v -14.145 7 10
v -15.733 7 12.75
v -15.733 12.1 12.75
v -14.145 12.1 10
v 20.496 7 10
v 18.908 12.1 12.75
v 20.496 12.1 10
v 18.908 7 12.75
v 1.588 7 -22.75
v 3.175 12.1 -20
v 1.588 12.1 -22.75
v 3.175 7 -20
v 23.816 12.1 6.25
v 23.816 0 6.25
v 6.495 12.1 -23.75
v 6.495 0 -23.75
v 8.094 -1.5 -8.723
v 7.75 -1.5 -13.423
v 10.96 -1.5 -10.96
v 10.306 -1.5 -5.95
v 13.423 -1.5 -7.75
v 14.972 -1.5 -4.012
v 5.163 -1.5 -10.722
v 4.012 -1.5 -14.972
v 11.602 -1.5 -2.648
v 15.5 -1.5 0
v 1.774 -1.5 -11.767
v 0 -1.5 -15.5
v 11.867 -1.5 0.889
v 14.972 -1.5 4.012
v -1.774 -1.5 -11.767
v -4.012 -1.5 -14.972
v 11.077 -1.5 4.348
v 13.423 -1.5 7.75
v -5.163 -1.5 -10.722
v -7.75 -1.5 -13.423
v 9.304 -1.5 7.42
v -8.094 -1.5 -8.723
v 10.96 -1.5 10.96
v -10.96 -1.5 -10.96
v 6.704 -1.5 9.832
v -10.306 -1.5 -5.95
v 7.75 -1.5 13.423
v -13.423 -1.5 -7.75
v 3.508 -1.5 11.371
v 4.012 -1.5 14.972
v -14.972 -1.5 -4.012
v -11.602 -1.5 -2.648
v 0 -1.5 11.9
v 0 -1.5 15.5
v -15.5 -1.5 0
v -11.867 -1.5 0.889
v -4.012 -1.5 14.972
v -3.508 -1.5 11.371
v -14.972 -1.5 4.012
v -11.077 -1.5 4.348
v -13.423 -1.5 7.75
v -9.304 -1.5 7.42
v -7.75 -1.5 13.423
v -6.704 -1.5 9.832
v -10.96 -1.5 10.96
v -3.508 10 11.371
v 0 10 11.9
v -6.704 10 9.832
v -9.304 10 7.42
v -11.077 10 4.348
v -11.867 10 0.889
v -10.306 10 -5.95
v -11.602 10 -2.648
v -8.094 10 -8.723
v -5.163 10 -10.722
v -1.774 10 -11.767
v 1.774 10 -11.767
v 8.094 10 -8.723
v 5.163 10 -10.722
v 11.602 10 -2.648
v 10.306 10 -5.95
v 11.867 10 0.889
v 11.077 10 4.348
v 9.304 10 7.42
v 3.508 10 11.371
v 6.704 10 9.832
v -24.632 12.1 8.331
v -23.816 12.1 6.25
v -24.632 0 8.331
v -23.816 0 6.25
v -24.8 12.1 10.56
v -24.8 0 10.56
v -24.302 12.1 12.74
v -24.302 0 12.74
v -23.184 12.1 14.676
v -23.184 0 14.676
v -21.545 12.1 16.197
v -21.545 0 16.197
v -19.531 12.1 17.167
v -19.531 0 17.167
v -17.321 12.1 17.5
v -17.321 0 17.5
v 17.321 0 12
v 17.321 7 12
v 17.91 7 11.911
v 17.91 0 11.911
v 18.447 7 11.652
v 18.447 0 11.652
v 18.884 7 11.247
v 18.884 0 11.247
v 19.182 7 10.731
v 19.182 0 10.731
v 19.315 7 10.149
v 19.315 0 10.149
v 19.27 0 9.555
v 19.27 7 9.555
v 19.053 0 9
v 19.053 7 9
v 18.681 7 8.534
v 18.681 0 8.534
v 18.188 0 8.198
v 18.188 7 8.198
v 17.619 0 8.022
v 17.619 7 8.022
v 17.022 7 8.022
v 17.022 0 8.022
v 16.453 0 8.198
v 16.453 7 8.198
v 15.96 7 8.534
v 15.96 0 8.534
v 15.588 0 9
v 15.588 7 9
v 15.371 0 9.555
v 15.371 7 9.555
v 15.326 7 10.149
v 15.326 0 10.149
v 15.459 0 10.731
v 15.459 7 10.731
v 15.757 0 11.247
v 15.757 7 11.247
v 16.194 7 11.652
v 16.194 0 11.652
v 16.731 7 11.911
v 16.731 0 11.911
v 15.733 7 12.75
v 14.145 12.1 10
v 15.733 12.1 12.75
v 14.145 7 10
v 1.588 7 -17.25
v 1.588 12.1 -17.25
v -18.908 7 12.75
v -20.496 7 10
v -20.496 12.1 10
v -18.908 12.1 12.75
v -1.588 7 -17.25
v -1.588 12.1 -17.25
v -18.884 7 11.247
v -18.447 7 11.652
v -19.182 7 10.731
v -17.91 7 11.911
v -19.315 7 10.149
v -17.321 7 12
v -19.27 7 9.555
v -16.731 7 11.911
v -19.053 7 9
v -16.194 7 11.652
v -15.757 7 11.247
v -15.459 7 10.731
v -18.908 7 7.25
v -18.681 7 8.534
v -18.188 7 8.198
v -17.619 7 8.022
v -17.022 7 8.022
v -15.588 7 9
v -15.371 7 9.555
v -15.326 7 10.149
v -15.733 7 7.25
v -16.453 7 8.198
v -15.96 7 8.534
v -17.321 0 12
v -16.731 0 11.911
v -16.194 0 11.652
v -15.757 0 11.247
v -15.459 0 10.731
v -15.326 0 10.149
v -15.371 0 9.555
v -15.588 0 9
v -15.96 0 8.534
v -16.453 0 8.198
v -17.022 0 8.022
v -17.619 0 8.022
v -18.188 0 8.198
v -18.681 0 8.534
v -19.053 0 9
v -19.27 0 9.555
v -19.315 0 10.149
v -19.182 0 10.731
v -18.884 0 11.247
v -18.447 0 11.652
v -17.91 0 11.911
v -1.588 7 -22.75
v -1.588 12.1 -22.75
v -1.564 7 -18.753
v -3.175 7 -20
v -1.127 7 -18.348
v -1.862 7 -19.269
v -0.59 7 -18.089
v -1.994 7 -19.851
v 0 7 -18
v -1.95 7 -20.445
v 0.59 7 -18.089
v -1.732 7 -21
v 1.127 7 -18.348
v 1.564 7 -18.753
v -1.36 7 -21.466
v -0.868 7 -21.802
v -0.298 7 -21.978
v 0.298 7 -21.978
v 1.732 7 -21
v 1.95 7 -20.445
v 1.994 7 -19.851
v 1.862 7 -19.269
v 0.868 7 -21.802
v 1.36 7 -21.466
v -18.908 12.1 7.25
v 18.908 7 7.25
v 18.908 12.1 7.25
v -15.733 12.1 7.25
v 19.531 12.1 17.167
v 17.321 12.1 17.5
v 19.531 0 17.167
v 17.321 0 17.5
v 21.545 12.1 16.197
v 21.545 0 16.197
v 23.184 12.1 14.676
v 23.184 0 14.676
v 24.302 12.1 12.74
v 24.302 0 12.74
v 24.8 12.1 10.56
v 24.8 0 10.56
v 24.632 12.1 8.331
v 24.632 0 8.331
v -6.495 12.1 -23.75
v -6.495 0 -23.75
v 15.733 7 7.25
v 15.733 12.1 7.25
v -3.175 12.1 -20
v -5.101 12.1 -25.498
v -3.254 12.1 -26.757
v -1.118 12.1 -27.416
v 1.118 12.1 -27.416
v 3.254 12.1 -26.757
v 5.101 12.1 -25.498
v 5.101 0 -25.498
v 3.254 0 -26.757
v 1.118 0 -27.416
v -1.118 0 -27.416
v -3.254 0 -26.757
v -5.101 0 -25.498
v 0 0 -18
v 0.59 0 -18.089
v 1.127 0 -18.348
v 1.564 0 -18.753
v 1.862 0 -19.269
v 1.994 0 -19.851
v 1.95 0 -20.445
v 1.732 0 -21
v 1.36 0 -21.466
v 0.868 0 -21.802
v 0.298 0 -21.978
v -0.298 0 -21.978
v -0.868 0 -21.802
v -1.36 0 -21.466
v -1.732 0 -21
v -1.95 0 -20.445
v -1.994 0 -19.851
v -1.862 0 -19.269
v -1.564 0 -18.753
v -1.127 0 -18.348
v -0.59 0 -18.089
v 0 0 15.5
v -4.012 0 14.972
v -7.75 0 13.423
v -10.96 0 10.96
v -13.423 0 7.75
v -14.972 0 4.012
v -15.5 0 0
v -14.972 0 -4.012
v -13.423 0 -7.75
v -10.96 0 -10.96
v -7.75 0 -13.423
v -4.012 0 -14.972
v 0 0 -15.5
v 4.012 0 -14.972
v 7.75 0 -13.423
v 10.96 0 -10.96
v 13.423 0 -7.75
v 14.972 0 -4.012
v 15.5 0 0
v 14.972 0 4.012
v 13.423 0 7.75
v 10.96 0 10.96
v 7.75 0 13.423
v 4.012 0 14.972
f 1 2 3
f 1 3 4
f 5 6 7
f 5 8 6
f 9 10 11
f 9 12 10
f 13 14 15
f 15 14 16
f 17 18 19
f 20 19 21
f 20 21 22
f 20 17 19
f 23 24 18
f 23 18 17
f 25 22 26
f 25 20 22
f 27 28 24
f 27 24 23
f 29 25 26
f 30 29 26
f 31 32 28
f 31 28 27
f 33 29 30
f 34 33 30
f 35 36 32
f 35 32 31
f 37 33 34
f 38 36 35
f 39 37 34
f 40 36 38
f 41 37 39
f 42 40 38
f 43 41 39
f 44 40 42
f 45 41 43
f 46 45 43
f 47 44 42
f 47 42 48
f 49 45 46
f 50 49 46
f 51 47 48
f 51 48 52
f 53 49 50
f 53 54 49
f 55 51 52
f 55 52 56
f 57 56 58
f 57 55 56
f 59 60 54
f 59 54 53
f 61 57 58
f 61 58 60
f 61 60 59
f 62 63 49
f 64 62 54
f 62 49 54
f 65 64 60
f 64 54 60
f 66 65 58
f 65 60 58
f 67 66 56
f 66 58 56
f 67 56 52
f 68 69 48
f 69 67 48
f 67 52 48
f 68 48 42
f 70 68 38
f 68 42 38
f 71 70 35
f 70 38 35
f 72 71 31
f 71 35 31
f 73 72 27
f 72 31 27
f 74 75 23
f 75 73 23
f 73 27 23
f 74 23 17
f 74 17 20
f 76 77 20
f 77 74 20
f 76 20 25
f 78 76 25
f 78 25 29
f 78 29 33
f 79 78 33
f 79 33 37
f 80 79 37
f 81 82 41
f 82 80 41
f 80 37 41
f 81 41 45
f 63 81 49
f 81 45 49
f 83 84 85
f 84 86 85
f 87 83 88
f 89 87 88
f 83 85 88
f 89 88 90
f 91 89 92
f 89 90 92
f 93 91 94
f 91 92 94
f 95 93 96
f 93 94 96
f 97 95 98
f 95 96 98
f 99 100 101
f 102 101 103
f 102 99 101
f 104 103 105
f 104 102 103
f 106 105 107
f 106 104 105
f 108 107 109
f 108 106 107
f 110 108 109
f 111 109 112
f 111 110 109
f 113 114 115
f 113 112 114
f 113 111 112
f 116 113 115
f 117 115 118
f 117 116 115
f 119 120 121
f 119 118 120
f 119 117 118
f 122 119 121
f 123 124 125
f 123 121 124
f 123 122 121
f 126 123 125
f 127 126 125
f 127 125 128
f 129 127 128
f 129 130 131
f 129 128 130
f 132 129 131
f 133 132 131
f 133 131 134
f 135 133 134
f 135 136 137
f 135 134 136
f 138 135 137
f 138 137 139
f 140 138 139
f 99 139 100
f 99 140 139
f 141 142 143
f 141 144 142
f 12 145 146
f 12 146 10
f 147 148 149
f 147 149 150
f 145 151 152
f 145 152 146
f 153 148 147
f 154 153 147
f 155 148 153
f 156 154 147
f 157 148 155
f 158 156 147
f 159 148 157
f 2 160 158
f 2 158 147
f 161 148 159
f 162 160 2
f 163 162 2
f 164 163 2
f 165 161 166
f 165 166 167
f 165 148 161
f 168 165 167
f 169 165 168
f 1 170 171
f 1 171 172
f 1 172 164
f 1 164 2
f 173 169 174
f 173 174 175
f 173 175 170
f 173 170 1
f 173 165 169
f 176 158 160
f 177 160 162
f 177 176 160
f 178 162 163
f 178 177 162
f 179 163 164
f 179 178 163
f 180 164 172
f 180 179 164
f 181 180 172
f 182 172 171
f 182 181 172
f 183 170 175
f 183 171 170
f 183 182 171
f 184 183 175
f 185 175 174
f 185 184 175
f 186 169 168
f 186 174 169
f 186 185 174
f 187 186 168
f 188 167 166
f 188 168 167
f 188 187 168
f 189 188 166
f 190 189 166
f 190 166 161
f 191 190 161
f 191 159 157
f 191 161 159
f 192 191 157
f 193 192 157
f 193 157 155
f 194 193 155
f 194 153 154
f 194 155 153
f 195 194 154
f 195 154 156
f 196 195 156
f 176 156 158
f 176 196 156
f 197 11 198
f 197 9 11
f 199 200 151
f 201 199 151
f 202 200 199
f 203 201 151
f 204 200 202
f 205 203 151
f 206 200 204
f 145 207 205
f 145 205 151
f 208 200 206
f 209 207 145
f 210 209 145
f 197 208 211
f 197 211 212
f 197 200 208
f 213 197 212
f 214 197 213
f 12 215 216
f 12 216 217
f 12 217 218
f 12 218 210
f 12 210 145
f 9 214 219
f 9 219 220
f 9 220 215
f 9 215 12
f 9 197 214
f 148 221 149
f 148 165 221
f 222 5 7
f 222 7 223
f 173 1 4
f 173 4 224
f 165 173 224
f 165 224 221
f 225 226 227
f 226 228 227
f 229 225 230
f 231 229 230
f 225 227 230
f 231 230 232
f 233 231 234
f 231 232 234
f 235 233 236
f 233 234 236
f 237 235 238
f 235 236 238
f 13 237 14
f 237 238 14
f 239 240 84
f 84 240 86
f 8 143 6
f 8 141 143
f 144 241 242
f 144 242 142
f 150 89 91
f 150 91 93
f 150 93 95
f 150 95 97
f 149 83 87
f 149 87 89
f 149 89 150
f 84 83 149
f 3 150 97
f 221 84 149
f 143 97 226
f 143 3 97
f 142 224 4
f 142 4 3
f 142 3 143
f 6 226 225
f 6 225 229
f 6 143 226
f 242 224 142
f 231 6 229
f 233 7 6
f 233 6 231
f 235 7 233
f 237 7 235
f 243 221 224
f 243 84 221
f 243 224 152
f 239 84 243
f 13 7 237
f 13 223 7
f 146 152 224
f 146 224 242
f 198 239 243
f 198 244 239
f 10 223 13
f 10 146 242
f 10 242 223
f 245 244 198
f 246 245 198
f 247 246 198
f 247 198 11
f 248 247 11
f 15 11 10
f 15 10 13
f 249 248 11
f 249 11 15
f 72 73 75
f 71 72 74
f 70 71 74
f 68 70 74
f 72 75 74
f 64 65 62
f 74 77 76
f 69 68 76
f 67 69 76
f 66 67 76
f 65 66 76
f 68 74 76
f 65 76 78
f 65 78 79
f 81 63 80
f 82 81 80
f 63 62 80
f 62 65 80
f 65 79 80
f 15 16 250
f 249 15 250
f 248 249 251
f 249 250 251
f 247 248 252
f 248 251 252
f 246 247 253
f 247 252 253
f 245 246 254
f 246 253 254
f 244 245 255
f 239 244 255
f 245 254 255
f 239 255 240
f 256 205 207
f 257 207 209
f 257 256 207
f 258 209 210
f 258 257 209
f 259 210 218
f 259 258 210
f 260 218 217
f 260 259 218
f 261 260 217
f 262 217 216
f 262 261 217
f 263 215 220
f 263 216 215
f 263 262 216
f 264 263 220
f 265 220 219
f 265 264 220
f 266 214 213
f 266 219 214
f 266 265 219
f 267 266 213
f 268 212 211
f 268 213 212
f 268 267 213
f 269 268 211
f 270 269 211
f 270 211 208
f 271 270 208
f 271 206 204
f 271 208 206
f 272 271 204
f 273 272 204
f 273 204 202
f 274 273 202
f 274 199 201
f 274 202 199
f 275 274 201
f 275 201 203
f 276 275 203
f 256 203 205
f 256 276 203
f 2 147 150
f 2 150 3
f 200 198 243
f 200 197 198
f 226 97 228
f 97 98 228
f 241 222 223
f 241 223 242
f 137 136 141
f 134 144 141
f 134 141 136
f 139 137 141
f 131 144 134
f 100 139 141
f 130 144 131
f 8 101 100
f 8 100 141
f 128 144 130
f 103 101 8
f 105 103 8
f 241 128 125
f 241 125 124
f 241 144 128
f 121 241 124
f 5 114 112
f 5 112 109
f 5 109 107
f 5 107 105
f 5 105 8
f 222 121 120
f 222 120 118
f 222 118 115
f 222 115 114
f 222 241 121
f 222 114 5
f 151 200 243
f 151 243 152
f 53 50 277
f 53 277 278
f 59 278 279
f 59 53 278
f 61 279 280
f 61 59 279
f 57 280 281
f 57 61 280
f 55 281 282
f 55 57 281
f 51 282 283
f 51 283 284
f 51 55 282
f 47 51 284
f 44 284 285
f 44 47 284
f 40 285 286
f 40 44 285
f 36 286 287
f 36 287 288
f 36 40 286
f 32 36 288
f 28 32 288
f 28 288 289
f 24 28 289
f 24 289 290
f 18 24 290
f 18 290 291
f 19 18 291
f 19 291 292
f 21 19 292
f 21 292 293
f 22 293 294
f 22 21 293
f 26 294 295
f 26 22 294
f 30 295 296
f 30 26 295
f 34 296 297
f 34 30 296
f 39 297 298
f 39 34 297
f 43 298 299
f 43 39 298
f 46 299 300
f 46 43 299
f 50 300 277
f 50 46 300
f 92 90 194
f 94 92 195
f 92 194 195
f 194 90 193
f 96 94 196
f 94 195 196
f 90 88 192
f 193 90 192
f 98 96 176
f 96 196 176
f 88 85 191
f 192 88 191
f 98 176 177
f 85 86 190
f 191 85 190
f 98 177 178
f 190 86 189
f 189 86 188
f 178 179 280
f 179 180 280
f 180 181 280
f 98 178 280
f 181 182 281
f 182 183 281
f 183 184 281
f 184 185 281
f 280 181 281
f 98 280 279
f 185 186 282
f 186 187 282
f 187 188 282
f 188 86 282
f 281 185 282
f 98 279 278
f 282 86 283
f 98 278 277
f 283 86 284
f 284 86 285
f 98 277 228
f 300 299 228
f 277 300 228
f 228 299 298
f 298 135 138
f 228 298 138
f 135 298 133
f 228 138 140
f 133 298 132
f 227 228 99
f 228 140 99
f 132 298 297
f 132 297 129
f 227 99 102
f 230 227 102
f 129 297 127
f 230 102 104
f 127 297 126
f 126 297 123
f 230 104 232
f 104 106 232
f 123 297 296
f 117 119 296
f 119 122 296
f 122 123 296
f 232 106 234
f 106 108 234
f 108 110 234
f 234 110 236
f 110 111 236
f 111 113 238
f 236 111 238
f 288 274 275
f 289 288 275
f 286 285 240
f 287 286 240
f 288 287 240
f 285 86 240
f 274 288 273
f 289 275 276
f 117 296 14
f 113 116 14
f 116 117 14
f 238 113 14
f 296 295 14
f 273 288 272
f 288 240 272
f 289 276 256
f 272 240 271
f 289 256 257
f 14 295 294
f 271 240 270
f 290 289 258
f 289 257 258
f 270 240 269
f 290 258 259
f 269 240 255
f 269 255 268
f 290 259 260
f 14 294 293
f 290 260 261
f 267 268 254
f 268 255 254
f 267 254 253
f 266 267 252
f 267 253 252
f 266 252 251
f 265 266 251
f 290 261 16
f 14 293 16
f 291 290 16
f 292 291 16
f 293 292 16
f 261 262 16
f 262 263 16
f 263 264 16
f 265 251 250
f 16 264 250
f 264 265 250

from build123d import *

# Parameters (mm, degrees)
ESQUISSE1_R             = 11.9
ESQUISSE1_R_2           = 2
BOSS_EXTRU_1_DEPTH      = 12
ENL_V_MAT_EXTRU_1_DEPTH = 5
SKETCH1_R               = 11.9
BOSS_EXTRUDE1_DEPTH     = 2
BOSS_EXTRUDE2_START     = 1.5
SKETCH2_R               = 15.5
SKETCH2_R_2             = 11.9
BOSS_EXTRUDE2_DEPTH     = 1.5
BOSS_EXTRUDE3_DEPTH     = 0.1


with BuildPart() as part:
    # Esquisse1 → Boss.-Extru.1 (new body)
    with BuildSketch(Plane(origin=(0, 0, 0), x_dir=(1, 0, 0), z_dir=(0, 1, 0))):
        with BuildLine():
            Line((-6.495190528, 23.75), (-23.815698604, -6.25))
            ThreePointArc((-23.815698604, -6.25), (-23.815698604, -13.75), (-17.320508076, -17.5))
            Line((-17.320508076, -17.5), (17.320508076, -17.5))
            ThreePointArc((17.320508076, -17.5), (23.815698604, -13.75), (23.815698604, -6.25))
            Line((23.815698604, -6.25), (6.495190528, 23.75))
            ThreePointArc((6.495190528, 23.75), (0, 27.5), (-6.495190528, 23.75))
        make_face()
        with Locations(Location((0, 0, 0), (0, 0, 270))):
            Circle(ESQUISSE1_R, mode=Mode.SUBTRACT)
        with Locations(Location((-17.320508076, -10, 0), (0, 0, 270))):
            Circle(ESQUISSE1_R_2, mode=Mode.SUBTRACT)
        with Locations(Location((0, 20, 0), (0, 0, 270))):
            Circle(ESQUISSE1_R_2, mode=Mode.SUBTRACT)
        with Locations(Location((17.320508076, -10, 0), (0, 0, 270))):
            Circle(ESQUISSE1_R_2, mode=Mode.SUBTRACT)
    extrude(amount=BOSS_EXTRU_1_DEPTH)

    # Esquisse2 → Enlèv. mat.-Extru.1 (cut)
    with BuildSketch(Plane(origin=(0, 12, 0), x_dir=(1, 0, 0), z_dir=(0, 1, 0))):
        Polygon((-18.908221316, -7.25), (-20.495934556, -10), (-18.908221316, -12.75), (-15.732794835, -12.75), (-14.145081595, -10), (-15.732794835, -7.25), align=None)
        Polygon((-1.58771324, 22.75), (-3.175426481, 20), (-1.58771324, 17.25), (1.58771324, 17.25), (3.175426481, 20), (1.58771324, 22.75), align=None)
        Polygon((18.908221316, -7.25), (15.732794835, -7.25), (14.145081595, -10), (15.732794835, -12.75), (18.908221316, -12.75), (20.495934556, -10), align=None)
    extrude(amount=-ENL_V_MAT_EXTRU_1_DEPTH, mode=Mode.SUBTRACT)

    # Sketch2 → Boss-Extrude2 (add)
    with BuildSketch(Plane.XZ.offset(BOSS_EXTRUDE2_START)):
        with Locations(Location((0, 0, 0), (0, 0, 90))):
            Circle(SKETCH2_R)
        with Locations(Location((0, 0, 0), (0, 0, 90))):
            Circle(SKETCH2_R_2, mode=Mode.SUBTRACT)
    extrude(amount=-BOSS_EXTRUDE2_DEPTH)



with BuildPart() as body_2:
    # Sketch1 → Boss-Extrude1 (new body)
    with BuildSketch(Plane(origin=(0, 12, 0), x_dir=(1, 0, 0), z_dir=(0, 1, 0))):
        with Locations(Location((0, 0, 0), (0, 0, 270))):
            Circle(SKETCH1_R)
    extrude(amount=-BOSS_EXTRUDE1_DEPTH)


with BuildPart() as part_1:
    add(part.part)

    add(body_2.part)  # Boss-Extrude3 merges body 2
    # Sketch3 → Boss-Extrude3 (add)
    with BuildSketch(Plane(origin=(0, 12, 0), x_dir=(1, 0, 0), z_dir=(0, 1, 0))):
        with BuildLine():
            Line((-6.495190528, 23.75), (-23.815698604, -6.25))
            ThreePointArc((-23.815698604, -6.25), (-23.815698604, -13.75), (-17.320508076, -17.5))
            Line((-17.320508076, -17.5), (17.320508076, -17.5))
            ThreePointArc((17.320508076, -17.5), (23.815698604, -13.75), (23.815698604, -6.25))
            Line((23.815698604, -6.25), (6.495190528, 23.75))
            ThreePointArc((6.495190528, 23.75), (0, 27.5), (-6.495190528, 23.75))
        make_face()
        Polygon((-1.58771324, 22.75), (-3.175426481, 20), (-1.58771324, 17.25), (1.58771324, 17.25), (3.175426481, 20), (1.58771324, 22.75), align=None, mode=Mode.SUBTRACT)
        Polygon((18.908221316, -12.75), (20.495934556, -10), (18.908221316, -7.25), (15.732794835, -7.25), (14.145081595, -10), (15.732794835, -12.75), align=None, mode=Mode.SUBTRACT)
        Polygon((-18.908221316, -7.25), (-20.495934556, -10), (-18.908221316, -12.75), (-15.732794835, -12.75), (-14.145081595, -10), (-15.732794835, -7.25), align=None, mode=Mode.SUBTRACT)
    extrude(amount=BOSS_EXTRUDE3_DEPTH)


solid = part_1.part
